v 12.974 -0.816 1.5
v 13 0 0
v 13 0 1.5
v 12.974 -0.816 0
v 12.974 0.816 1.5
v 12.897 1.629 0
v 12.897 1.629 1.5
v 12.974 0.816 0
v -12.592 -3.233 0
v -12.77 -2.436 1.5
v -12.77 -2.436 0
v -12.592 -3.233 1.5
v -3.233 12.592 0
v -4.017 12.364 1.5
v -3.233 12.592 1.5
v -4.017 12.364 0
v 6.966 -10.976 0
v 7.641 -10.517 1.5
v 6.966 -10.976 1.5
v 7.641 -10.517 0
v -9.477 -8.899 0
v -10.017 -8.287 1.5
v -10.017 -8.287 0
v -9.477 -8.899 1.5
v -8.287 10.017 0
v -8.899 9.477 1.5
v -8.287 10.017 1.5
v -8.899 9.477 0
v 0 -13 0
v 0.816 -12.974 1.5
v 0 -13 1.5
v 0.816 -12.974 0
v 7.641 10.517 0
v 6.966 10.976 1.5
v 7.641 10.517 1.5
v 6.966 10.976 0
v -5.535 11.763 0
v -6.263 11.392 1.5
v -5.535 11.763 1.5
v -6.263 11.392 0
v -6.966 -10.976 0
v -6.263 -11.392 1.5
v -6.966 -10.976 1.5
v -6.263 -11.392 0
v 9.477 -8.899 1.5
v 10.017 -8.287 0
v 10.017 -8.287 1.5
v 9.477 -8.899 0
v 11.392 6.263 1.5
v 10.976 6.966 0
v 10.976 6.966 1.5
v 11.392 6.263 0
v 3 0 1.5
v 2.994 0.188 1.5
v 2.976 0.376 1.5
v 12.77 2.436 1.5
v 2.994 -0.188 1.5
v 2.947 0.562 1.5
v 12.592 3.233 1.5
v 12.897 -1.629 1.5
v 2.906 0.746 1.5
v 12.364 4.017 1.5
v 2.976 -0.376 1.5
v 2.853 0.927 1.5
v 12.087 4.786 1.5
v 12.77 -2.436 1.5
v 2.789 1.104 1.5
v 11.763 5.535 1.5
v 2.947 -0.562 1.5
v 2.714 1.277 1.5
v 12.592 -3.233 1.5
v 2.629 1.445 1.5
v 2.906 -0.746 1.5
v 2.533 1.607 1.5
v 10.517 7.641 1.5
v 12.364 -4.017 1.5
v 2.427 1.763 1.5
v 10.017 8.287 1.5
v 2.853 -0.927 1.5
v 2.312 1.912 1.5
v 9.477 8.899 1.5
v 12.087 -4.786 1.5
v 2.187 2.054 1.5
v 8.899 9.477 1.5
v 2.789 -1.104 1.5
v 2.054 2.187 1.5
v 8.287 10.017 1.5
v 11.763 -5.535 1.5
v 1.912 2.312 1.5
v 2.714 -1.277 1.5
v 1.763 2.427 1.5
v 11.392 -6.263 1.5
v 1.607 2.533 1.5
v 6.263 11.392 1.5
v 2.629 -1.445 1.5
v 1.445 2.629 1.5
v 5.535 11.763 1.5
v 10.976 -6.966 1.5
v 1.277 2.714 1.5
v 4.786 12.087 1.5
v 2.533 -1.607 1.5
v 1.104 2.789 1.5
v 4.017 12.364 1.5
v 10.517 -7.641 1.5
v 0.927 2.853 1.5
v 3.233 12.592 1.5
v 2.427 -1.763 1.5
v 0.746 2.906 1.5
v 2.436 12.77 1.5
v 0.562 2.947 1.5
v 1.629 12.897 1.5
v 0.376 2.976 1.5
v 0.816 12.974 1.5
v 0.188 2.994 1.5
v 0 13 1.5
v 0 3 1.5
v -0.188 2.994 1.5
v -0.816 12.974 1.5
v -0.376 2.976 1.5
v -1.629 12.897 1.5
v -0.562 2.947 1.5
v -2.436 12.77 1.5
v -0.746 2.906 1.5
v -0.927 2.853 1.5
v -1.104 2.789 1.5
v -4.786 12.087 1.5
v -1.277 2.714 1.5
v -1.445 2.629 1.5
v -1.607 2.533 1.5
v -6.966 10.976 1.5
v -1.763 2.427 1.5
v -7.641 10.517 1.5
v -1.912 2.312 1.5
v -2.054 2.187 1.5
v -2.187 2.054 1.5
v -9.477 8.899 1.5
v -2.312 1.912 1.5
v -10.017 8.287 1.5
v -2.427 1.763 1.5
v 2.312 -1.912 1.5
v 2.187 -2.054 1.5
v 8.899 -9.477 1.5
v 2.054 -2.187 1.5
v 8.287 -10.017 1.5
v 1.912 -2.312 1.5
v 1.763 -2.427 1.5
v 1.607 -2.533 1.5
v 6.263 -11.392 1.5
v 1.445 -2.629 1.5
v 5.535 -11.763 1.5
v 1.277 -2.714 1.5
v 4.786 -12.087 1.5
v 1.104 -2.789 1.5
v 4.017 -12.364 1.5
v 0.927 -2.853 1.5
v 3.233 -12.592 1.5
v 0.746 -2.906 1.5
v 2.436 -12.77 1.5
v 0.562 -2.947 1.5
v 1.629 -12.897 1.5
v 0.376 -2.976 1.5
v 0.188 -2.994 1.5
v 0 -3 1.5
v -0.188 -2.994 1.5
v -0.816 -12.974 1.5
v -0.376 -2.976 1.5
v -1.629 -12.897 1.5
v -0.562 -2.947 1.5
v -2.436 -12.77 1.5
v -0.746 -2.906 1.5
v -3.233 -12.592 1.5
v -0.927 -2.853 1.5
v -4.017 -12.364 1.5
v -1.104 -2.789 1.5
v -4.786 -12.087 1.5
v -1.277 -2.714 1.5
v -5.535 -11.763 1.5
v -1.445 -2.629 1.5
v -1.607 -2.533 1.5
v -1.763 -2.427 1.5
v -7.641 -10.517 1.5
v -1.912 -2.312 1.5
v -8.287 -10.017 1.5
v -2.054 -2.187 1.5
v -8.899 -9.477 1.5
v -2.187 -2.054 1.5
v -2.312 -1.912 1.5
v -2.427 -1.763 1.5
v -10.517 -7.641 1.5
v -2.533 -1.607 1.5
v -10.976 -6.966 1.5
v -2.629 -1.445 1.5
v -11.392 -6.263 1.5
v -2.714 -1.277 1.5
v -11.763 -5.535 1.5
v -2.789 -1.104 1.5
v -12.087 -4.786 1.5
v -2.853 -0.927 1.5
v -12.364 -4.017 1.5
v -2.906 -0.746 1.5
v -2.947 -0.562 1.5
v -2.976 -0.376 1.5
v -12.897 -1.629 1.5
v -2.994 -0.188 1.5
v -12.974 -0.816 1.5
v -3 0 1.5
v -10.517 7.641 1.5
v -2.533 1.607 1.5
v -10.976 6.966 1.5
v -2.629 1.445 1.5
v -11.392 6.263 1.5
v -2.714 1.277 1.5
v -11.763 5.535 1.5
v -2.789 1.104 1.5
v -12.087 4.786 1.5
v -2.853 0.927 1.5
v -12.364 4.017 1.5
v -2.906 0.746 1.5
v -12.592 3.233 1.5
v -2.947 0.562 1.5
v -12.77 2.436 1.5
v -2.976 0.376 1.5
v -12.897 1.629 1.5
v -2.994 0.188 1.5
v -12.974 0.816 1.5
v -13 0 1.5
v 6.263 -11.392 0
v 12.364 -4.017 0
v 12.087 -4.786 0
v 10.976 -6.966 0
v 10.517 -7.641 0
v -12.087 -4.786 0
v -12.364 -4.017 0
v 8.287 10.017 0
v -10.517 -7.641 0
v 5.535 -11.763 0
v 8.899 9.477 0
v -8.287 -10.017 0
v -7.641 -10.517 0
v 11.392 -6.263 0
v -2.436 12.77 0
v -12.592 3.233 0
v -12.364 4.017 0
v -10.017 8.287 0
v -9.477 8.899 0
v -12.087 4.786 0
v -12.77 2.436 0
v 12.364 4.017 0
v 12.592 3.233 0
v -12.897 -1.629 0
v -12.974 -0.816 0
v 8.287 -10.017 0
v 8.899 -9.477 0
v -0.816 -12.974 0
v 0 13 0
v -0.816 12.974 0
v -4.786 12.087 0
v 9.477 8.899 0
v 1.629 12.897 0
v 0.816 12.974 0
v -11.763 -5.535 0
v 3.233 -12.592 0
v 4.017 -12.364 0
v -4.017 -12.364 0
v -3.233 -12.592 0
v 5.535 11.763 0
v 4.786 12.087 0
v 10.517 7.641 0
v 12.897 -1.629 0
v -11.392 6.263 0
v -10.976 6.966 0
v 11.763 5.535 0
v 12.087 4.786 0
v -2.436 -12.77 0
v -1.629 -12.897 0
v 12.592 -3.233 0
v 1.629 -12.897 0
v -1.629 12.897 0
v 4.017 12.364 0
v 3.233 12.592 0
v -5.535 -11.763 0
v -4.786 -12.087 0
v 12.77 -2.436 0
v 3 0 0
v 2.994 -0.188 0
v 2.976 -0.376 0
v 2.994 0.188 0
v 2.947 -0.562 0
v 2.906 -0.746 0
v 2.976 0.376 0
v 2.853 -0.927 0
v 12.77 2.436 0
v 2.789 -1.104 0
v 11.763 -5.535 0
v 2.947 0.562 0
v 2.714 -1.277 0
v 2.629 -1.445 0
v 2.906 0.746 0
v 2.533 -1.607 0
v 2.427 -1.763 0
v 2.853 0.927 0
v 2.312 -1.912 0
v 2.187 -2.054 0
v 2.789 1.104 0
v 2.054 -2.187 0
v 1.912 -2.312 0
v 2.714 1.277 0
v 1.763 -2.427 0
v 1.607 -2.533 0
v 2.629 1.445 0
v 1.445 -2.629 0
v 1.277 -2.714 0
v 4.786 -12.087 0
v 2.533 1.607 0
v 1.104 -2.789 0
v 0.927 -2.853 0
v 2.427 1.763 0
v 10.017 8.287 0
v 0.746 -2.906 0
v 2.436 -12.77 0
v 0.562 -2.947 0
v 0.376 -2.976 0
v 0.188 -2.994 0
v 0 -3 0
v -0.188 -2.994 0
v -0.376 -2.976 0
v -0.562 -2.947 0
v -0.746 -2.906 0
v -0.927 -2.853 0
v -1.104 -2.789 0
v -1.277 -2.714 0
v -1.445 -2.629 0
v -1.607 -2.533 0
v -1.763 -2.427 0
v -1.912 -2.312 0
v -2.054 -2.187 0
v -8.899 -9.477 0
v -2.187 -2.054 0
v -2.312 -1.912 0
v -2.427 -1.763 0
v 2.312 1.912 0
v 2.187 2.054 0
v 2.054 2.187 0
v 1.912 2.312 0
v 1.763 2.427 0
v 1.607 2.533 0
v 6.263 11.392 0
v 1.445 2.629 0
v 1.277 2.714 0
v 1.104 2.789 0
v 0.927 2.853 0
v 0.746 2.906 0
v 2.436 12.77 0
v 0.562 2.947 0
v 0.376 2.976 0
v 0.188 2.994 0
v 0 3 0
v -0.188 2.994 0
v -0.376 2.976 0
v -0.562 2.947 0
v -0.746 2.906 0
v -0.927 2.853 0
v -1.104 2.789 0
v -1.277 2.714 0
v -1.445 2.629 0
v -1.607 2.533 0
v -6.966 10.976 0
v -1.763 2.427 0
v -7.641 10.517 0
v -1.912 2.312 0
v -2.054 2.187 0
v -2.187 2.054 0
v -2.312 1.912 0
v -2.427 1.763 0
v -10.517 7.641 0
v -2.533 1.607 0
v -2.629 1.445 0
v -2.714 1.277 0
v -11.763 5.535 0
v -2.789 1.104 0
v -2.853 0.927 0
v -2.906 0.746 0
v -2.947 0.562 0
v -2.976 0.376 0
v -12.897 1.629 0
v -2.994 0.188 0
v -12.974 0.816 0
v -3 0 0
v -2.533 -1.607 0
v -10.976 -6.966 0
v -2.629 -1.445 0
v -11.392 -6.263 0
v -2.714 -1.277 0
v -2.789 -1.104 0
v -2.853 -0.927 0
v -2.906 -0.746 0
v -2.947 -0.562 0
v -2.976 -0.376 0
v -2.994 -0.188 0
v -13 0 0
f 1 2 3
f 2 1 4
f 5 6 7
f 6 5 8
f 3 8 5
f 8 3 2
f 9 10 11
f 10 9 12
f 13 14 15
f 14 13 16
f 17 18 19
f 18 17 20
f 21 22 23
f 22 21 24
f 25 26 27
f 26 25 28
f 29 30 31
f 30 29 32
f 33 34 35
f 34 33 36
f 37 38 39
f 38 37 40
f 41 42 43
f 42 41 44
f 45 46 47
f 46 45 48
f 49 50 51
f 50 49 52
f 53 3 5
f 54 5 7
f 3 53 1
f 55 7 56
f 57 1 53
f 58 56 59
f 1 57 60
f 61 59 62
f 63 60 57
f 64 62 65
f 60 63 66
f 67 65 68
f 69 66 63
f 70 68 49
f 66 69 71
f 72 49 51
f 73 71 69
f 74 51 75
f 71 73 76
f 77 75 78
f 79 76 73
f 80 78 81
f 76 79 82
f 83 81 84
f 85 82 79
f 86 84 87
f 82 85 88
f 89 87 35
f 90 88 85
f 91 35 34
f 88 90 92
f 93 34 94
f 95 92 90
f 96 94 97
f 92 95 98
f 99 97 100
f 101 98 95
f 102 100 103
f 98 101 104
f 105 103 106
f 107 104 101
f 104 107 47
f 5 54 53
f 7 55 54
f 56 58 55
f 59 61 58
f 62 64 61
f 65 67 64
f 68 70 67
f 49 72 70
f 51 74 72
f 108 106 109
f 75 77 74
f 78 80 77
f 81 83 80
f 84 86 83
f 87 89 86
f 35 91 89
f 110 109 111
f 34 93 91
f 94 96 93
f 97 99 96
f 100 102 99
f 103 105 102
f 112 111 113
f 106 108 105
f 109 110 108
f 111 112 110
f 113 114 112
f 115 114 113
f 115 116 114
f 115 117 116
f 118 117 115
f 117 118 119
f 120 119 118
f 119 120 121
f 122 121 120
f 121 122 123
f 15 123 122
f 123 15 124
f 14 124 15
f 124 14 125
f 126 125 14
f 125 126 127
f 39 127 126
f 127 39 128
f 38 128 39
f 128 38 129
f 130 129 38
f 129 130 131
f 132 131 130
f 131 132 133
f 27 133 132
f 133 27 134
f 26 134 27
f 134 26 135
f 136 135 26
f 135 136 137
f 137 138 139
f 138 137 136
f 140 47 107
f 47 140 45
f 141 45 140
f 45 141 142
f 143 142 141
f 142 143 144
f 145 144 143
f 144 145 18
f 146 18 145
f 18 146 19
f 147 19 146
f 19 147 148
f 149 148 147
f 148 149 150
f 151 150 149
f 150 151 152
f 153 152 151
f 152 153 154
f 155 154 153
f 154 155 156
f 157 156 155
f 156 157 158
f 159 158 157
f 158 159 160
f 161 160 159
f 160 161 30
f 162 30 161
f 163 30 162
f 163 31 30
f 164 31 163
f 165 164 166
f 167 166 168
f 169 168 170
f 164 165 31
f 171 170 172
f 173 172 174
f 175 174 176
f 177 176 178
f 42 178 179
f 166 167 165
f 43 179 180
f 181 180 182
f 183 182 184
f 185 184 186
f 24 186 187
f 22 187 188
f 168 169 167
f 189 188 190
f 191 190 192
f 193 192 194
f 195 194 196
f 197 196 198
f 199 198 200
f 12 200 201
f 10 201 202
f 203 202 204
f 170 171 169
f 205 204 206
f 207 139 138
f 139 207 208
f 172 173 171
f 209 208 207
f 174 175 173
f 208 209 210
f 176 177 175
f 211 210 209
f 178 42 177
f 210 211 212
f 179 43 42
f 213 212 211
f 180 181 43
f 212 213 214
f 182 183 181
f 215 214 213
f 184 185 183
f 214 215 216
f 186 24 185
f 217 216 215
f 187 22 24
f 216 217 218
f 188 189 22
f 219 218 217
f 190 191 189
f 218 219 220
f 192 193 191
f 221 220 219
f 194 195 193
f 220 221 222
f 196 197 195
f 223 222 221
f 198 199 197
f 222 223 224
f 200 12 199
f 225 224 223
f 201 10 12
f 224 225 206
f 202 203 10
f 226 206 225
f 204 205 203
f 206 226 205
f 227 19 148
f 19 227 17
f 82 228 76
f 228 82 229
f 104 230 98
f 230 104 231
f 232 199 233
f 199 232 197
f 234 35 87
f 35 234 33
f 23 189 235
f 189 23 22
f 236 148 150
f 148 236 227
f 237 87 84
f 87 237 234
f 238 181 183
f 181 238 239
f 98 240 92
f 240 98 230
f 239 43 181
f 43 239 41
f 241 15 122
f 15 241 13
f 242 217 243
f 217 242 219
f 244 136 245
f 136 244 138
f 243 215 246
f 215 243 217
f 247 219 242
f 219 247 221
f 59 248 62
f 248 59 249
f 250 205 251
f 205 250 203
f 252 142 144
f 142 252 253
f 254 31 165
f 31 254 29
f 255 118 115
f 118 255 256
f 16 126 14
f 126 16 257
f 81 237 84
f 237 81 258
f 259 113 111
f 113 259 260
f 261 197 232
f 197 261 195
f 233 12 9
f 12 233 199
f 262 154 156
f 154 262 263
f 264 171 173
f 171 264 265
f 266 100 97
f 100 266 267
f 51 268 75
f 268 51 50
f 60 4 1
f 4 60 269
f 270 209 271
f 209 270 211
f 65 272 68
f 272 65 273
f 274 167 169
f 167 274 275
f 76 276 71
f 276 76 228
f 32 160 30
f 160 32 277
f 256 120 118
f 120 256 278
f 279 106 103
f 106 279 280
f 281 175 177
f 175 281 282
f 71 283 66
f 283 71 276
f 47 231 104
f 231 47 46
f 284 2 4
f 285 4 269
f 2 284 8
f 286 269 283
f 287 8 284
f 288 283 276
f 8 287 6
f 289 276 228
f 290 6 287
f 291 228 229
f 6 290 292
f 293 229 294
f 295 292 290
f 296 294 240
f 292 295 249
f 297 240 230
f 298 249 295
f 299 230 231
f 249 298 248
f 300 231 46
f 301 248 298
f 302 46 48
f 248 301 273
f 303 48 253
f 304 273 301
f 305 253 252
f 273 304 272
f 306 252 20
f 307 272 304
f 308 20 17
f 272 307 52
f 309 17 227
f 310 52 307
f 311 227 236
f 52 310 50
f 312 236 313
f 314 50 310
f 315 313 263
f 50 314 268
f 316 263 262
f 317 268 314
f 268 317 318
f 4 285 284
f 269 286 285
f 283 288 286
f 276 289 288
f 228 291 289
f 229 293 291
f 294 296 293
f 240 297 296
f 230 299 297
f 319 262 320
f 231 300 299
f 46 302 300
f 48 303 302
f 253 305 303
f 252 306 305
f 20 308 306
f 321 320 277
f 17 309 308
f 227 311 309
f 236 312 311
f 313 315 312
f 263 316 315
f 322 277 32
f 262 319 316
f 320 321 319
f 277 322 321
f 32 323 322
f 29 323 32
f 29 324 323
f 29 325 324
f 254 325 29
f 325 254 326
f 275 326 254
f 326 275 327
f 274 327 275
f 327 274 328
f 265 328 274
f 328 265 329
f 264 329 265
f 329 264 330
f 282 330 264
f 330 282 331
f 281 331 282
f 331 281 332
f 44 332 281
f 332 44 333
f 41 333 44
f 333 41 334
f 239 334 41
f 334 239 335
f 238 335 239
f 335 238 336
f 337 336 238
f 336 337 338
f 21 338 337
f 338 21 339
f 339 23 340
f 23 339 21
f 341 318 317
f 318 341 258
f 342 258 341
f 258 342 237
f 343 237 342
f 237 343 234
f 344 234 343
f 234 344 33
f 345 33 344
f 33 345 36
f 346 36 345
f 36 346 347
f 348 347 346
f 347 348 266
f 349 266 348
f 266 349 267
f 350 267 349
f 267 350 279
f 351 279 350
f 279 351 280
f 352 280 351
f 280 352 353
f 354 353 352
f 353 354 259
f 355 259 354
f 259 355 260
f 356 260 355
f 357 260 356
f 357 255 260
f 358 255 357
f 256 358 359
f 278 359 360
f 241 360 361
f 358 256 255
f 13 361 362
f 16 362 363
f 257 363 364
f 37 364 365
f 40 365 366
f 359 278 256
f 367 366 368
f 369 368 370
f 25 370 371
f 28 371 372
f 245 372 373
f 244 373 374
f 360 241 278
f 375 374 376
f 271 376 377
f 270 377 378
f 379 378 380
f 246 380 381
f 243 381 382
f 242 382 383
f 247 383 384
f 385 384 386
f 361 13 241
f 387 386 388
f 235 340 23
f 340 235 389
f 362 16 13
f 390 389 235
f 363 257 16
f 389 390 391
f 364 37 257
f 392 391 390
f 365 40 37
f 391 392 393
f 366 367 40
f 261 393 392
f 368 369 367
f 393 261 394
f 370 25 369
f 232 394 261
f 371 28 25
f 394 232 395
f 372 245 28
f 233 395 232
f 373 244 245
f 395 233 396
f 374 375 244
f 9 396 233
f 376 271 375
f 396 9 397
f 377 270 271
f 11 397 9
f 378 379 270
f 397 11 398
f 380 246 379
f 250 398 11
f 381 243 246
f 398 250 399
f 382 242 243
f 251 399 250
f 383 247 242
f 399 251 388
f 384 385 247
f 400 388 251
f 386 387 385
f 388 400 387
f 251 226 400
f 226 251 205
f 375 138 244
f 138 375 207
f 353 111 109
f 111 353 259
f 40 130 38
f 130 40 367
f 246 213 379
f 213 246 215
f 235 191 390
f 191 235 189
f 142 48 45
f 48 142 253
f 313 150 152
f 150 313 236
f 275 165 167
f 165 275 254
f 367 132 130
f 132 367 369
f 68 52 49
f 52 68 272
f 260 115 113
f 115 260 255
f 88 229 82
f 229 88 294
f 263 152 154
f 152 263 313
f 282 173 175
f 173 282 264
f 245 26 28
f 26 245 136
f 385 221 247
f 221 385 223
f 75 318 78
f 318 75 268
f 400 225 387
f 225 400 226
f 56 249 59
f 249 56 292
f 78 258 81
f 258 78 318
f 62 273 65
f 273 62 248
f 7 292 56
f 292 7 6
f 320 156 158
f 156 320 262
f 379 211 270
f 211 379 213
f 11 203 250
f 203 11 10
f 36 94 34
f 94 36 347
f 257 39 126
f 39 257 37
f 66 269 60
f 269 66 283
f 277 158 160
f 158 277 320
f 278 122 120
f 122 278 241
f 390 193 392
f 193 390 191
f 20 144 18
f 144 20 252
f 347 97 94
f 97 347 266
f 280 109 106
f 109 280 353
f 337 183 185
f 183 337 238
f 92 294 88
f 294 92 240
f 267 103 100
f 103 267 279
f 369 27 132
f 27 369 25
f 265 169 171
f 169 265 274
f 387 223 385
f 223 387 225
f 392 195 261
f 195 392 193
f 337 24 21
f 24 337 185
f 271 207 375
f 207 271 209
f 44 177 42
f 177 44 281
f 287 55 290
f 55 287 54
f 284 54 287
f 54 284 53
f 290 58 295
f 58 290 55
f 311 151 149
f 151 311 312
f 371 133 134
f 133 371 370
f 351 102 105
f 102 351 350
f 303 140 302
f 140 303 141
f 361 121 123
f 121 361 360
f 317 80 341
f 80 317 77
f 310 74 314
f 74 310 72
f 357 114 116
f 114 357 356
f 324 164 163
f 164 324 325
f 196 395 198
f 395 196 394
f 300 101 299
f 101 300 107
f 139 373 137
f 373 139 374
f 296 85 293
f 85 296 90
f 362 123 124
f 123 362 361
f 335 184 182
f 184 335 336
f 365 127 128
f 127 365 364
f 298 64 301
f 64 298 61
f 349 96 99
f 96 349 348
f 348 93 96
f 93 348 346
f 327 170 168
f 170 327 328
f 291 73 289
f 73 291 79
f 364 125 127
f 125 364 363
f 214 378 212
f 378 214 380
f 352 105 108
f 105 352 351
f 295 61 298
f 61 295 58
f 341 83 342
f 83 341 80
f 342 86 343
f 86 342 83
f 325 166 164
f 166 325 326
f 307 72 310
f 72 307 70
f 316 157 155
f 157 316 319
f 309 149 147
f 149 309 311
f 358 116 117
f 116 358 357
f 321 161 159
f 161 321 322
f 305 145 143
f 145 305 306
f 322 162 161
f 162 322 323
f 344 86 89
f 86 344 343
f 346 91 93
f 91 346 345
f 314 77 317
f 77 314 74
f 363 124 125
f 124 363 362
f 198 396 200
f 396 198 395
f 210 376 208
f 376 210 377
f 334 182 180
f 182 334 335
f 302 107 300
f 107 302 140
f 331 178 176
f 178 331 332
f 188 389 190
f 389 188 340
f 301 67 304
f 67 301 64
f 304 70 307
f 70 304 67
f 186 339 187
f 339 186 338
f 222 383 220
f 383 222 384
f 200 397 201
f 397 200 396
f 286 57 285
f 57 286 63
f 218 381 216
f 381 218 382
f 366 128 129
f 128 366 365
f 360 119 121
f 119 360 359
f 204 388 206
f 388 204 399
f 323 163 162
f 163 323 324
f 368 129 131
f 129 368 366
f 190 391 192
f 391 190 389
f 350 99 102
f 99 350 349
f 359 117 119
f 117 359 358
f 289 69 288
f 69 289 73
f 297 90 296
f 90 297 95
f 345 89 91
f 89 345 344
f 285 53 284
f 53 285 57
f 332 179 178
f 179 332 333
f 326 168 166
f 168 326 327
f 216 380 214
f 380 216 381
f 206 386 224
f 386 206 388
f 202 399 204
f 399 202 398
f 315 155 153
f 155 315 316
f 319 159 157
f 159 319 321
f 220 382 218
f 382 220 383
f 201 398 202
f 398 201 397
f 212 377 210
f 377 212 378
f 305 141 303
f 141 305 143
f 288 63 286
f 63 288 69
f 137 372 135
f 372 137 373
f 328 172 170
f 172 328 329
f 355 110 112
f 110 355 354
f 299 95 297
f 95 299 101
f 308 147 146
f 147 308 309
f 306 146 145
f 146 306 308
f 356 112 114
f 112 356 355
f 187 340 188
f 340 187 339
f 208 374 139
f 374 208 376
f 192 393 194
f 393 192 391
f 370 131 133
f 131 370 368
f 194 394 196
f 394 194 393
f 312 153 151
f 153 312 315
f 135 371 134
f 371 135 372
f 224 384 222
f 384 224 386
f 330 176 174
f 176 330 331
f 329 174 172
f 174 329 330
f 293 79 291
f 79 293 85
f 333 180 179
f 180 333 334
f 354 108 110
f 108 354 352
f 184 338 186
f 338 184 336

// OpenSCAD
module penny_washer_body(outer_diameter, inner_diameter, thickness) {
    difference() {
        cylinder(h = thickness, d = outer_diameter, $fn=100);
        translate([0, 0, -1])
            cylinder(h = thickness + 2, d = inner_diameter, $fn=100);
    }
}

module penny_washer() {
    penny_washer_body(outer_diameter = 26.0, inner_diameter = 6.0, thickness = 1.5);
}

penny_washer();
